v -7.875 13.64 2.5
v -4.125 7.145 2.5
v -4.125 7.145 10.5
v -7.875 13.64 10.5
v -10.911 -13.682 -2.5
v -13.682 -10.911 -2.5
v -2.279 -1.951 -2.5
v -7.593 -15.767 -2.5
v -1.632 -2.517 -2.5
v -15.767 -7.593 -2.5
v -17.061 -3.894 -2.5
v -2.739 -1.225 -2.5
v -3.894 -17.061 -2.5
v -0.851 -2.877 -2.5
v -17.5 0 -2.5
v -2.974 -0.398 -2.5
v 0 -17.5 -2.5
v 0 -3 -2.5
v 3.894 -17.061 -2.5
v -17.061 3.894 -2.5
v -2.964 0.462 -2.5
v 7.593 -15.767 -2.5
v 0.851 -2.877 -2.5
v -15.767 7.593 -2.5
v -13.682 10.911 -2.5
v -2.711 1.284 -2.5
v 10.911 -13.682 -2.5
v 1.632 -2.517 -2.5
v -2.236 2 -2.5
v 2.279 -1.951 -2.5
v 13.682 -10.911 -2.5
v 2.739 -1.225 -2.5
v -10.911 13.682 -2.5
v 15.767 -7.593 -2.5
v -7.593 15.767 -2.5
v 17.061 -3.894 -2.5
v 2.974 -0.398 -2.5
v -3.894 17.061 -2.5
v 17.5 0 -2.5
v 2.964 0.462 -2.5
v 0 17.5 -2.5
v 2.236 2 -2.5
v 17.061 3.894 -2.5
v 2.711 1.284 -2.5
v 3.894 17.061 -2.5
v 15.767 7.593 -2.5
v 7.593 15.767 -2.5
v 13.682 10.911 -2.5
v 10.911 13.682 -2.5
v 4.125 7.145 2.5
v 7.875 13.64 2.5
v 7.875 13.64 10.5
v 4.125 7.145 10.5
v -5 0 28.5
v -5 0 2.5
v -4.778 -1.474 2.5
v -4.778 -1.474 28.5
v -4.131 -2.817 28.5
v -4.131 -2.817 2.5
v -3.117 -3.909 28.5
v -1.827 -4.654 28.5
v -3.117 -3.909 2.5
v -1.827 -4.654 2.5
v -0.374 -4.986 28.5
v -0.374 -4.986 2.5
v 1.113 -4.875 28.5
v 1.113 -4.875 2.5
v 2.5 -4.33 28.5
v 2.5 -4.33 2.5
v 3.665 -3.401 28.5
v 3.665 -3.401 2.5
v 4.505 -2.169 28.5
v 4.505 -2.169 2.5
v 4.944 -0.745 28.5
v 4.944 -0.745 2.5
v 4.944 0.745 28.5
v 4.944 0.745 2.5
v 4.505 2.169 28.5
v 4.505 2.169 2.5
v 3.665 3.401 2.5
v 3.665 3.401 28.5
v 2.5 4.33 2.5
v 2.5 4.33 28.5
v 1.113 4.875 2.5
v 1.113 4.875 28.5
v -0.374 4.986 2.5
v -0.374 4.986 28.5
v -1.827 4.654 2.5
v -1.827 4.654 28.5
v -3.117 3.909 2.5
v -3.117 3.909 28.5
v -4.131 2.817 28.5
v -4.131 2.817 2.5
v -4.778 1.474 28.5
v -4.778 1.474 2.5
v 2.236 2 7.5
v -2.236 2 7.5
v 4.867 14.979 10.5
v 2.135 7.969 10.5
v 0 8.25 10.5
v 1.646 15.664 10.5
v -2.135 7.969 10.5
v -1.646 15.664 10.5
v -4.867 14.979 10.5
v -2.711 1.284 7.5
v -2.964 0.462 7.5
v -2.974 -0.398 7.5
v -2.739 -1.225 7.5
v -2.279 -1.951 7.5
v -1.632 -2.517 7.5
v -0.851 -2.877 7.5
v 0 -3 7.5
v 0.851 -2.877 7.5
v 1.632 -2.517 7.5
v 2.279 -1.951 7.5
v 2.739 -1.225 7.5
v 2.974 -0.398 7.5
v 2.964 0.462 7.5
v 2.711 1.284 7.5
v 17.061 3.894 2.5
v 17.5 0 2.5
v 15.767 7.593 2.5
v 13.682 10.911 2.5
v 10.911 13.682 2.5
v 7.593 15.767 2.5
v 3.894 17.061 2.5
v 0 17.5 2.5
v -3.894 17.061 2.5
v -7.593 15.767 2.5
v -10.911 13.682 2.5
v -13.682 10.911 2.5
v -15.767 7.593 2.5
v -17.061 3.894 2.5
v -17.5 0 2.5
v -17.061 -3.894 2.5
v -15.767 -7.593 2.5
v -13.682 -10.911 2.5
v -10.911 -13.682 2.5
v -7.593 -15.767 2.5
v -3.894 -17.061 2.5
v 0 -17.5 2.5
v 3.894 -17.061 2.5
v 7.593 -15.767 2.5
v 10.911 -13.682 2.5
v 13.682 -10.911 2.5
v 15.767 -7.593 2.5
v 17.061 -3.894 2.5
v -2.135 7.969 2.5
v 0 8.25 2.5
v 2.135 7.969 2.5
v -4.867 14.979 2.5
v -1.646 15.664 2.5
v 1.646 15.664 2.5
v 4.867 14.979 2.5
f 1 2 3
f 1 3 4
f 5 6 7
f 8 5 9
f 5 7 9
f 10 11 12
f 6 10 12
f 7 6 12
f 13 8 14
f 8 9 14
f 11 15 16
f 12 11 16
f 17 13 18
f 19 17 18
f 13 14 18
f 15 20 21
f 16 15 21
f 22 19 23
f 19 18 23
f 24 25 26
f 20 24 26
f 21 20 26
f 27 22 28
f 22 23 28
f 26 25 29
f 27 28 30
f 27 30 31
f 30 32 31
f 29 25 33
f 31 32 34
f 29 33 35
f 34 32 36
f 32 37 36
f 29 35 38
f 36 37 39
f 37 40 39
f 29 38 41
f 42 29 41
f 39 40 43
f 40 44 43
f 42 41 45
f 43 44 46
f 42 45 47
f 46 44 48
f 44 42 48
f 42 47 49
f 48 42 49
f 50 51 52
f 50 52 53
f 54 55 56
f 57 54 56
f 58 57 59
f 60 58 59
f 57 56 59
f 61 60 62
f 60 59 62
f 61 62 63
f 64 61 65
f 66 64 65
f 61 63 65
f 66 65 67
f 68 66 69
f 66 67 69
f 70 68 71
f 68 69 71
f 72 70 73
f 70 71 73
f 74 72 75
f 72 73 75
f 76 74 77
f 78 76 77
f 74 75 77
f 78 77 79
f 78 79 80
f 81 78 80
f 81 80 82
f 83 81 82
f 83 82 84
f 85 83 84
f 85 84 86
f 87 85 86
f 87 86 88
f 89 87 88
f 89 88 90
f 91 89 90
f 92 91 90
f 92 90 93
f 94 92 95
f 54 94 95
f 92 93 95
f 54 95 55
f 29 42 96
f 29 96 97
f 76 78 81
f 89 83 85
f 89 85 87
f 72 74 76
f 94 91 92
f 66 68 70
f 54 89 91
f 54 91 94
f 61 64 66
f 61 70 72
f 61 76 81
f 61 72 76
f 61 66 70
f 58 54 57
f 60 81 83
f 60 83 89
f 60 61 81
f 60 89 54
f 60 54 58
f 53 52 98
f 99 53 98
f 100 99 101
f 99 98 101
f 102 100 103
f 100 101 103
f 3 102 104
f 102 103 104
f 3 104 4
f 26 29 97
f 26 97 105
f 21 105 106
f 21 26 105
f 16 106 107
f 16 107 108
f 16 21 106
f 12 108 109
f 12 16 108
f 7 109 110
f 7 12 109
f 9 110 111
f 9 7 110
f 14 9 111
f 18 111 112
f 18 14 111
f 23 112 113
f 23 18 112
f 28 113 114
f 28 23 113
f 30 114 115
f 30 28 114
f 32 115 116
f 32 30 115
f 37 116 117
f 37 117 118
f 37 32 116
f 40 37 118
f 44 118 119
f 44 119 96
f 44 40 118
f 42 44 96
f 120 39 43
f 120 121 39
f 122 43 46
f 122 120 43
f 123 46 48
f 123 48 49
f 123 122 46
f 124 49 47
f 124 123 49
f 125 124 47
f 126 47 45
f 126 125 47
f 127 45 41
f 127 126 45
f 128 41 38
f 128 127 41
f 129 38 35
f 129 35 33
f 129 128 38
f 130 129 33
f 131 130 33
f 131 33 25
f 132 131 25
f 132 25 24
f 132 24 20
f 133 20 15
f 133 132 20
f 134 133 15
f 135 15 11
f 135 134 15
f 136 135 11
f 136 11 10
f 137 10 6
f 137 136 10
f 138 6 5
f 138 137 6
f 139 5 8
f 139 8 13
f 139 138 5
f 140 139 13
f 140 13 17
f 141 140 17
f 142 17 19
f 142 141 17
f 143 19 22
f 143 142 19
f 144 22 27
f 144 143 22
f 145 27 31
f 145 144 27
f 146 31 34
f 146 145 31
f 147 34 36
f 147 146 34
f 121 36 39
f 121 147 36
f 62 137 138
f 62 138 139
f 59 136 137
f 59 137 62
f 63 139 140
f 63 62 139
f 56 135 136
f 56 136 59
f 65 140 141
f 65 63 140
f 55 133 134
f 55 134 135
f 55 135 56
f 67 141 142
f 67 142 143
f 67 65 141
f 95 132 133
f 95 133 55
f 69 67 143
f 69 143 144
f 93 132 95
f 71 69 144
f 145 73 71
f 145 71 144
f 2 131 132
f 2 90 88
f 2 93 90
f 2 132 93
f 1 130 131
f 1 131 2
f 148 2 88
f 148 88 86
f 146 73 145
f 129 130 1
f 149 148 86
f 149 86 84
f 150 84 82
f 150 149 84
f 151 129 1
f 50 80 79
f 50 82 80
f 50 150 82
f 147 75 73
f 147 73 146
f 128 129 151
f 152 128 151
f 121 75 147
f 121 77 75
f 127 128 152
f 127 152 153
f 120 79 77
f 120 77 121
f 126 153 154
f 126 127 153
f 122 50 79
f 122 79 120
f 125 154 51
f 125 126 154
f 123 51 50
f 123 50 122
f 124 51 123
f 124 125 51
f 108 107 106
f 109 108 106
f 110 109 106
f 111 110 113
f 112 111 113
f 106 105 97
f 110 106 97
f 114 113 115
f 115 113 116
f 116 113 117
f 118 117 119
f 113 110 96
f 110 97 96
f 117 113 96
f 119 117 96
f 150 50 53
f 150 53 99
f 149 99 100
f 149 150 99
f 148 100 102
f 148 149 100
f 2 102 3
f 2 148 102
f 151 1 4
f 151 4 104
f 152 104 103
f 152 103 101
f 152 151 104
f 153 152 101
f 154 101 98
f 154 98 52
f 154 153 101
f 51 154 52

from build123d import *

# Parameters (mm, degrees)
SKETCH1_R           = 17.5
BOSS_EXTRUDE1_DEPTH = 2.5
BOSS_EXTRUDE2_DEPTH = 8
SKETCH3_R           = 5
BOSS_EXTRUDE3_DEPTH = 26
CUT_EXTRUDE1_DEPTH  = 10


with BuildPart() as part:
    # Sketch1 → Boss-Extrude1 (new, symmetric)
    with BuildSketch(Plane.XY):
        Circle(SKETCH1_R)
    extrude(amount=BOSS_EXTRUDE1_DEPTH, both=True)

    # Sketch2 → Boss-Extrude2 (add)
    with BuildSketch(Plane.XY.offset(2.5)):
        with BuildLine():
            Line((7.875, 13.63990011), (4.125, 7.144709581))
            ThreePointArc((4.125, 7.144709581), (0, 8.25), (-4.125, 7.144709581))
            Line((-4.125, 7.144709581), (-7.875, 13.63990011))
            ThreePointArc((-7.875, 13.63990011), (0, 15.75), (7.875, 13.63990011))
        make_face()
    extrude(amount=BOSS_EXTRUDE2_DEPTH)

    # Sketch3 → Boss-Extrude3 (add)
    with BuildSketch(Plane.XY.offset(2.5)):
        with Locations(Location((0, 0, 0), (0, 0, 180))):
            Circle(SKETCH3_R)
    extrude(amount=BOSS_EXTRUDE3_DEPTH)

    # Sketch4 → Cut-Extrude1 (cut)
    with BuildSketch(Plane(origin=(0, 0, -2.5), x_dir=(-1, 0, 0), z_dir=(0, 0, -1))):
        with BuildLine():
            Line((-2.236067977, 2), (2.236067977, 2))
            ThreePointArc((2.236067977, 2), (0, -3), (-2.236067977, 2))
        make_face()
    extrude(amount=-CUT_EXTRUDE1_DEPTH, mode=Mode.SUBTRACT)


solid = part.part
